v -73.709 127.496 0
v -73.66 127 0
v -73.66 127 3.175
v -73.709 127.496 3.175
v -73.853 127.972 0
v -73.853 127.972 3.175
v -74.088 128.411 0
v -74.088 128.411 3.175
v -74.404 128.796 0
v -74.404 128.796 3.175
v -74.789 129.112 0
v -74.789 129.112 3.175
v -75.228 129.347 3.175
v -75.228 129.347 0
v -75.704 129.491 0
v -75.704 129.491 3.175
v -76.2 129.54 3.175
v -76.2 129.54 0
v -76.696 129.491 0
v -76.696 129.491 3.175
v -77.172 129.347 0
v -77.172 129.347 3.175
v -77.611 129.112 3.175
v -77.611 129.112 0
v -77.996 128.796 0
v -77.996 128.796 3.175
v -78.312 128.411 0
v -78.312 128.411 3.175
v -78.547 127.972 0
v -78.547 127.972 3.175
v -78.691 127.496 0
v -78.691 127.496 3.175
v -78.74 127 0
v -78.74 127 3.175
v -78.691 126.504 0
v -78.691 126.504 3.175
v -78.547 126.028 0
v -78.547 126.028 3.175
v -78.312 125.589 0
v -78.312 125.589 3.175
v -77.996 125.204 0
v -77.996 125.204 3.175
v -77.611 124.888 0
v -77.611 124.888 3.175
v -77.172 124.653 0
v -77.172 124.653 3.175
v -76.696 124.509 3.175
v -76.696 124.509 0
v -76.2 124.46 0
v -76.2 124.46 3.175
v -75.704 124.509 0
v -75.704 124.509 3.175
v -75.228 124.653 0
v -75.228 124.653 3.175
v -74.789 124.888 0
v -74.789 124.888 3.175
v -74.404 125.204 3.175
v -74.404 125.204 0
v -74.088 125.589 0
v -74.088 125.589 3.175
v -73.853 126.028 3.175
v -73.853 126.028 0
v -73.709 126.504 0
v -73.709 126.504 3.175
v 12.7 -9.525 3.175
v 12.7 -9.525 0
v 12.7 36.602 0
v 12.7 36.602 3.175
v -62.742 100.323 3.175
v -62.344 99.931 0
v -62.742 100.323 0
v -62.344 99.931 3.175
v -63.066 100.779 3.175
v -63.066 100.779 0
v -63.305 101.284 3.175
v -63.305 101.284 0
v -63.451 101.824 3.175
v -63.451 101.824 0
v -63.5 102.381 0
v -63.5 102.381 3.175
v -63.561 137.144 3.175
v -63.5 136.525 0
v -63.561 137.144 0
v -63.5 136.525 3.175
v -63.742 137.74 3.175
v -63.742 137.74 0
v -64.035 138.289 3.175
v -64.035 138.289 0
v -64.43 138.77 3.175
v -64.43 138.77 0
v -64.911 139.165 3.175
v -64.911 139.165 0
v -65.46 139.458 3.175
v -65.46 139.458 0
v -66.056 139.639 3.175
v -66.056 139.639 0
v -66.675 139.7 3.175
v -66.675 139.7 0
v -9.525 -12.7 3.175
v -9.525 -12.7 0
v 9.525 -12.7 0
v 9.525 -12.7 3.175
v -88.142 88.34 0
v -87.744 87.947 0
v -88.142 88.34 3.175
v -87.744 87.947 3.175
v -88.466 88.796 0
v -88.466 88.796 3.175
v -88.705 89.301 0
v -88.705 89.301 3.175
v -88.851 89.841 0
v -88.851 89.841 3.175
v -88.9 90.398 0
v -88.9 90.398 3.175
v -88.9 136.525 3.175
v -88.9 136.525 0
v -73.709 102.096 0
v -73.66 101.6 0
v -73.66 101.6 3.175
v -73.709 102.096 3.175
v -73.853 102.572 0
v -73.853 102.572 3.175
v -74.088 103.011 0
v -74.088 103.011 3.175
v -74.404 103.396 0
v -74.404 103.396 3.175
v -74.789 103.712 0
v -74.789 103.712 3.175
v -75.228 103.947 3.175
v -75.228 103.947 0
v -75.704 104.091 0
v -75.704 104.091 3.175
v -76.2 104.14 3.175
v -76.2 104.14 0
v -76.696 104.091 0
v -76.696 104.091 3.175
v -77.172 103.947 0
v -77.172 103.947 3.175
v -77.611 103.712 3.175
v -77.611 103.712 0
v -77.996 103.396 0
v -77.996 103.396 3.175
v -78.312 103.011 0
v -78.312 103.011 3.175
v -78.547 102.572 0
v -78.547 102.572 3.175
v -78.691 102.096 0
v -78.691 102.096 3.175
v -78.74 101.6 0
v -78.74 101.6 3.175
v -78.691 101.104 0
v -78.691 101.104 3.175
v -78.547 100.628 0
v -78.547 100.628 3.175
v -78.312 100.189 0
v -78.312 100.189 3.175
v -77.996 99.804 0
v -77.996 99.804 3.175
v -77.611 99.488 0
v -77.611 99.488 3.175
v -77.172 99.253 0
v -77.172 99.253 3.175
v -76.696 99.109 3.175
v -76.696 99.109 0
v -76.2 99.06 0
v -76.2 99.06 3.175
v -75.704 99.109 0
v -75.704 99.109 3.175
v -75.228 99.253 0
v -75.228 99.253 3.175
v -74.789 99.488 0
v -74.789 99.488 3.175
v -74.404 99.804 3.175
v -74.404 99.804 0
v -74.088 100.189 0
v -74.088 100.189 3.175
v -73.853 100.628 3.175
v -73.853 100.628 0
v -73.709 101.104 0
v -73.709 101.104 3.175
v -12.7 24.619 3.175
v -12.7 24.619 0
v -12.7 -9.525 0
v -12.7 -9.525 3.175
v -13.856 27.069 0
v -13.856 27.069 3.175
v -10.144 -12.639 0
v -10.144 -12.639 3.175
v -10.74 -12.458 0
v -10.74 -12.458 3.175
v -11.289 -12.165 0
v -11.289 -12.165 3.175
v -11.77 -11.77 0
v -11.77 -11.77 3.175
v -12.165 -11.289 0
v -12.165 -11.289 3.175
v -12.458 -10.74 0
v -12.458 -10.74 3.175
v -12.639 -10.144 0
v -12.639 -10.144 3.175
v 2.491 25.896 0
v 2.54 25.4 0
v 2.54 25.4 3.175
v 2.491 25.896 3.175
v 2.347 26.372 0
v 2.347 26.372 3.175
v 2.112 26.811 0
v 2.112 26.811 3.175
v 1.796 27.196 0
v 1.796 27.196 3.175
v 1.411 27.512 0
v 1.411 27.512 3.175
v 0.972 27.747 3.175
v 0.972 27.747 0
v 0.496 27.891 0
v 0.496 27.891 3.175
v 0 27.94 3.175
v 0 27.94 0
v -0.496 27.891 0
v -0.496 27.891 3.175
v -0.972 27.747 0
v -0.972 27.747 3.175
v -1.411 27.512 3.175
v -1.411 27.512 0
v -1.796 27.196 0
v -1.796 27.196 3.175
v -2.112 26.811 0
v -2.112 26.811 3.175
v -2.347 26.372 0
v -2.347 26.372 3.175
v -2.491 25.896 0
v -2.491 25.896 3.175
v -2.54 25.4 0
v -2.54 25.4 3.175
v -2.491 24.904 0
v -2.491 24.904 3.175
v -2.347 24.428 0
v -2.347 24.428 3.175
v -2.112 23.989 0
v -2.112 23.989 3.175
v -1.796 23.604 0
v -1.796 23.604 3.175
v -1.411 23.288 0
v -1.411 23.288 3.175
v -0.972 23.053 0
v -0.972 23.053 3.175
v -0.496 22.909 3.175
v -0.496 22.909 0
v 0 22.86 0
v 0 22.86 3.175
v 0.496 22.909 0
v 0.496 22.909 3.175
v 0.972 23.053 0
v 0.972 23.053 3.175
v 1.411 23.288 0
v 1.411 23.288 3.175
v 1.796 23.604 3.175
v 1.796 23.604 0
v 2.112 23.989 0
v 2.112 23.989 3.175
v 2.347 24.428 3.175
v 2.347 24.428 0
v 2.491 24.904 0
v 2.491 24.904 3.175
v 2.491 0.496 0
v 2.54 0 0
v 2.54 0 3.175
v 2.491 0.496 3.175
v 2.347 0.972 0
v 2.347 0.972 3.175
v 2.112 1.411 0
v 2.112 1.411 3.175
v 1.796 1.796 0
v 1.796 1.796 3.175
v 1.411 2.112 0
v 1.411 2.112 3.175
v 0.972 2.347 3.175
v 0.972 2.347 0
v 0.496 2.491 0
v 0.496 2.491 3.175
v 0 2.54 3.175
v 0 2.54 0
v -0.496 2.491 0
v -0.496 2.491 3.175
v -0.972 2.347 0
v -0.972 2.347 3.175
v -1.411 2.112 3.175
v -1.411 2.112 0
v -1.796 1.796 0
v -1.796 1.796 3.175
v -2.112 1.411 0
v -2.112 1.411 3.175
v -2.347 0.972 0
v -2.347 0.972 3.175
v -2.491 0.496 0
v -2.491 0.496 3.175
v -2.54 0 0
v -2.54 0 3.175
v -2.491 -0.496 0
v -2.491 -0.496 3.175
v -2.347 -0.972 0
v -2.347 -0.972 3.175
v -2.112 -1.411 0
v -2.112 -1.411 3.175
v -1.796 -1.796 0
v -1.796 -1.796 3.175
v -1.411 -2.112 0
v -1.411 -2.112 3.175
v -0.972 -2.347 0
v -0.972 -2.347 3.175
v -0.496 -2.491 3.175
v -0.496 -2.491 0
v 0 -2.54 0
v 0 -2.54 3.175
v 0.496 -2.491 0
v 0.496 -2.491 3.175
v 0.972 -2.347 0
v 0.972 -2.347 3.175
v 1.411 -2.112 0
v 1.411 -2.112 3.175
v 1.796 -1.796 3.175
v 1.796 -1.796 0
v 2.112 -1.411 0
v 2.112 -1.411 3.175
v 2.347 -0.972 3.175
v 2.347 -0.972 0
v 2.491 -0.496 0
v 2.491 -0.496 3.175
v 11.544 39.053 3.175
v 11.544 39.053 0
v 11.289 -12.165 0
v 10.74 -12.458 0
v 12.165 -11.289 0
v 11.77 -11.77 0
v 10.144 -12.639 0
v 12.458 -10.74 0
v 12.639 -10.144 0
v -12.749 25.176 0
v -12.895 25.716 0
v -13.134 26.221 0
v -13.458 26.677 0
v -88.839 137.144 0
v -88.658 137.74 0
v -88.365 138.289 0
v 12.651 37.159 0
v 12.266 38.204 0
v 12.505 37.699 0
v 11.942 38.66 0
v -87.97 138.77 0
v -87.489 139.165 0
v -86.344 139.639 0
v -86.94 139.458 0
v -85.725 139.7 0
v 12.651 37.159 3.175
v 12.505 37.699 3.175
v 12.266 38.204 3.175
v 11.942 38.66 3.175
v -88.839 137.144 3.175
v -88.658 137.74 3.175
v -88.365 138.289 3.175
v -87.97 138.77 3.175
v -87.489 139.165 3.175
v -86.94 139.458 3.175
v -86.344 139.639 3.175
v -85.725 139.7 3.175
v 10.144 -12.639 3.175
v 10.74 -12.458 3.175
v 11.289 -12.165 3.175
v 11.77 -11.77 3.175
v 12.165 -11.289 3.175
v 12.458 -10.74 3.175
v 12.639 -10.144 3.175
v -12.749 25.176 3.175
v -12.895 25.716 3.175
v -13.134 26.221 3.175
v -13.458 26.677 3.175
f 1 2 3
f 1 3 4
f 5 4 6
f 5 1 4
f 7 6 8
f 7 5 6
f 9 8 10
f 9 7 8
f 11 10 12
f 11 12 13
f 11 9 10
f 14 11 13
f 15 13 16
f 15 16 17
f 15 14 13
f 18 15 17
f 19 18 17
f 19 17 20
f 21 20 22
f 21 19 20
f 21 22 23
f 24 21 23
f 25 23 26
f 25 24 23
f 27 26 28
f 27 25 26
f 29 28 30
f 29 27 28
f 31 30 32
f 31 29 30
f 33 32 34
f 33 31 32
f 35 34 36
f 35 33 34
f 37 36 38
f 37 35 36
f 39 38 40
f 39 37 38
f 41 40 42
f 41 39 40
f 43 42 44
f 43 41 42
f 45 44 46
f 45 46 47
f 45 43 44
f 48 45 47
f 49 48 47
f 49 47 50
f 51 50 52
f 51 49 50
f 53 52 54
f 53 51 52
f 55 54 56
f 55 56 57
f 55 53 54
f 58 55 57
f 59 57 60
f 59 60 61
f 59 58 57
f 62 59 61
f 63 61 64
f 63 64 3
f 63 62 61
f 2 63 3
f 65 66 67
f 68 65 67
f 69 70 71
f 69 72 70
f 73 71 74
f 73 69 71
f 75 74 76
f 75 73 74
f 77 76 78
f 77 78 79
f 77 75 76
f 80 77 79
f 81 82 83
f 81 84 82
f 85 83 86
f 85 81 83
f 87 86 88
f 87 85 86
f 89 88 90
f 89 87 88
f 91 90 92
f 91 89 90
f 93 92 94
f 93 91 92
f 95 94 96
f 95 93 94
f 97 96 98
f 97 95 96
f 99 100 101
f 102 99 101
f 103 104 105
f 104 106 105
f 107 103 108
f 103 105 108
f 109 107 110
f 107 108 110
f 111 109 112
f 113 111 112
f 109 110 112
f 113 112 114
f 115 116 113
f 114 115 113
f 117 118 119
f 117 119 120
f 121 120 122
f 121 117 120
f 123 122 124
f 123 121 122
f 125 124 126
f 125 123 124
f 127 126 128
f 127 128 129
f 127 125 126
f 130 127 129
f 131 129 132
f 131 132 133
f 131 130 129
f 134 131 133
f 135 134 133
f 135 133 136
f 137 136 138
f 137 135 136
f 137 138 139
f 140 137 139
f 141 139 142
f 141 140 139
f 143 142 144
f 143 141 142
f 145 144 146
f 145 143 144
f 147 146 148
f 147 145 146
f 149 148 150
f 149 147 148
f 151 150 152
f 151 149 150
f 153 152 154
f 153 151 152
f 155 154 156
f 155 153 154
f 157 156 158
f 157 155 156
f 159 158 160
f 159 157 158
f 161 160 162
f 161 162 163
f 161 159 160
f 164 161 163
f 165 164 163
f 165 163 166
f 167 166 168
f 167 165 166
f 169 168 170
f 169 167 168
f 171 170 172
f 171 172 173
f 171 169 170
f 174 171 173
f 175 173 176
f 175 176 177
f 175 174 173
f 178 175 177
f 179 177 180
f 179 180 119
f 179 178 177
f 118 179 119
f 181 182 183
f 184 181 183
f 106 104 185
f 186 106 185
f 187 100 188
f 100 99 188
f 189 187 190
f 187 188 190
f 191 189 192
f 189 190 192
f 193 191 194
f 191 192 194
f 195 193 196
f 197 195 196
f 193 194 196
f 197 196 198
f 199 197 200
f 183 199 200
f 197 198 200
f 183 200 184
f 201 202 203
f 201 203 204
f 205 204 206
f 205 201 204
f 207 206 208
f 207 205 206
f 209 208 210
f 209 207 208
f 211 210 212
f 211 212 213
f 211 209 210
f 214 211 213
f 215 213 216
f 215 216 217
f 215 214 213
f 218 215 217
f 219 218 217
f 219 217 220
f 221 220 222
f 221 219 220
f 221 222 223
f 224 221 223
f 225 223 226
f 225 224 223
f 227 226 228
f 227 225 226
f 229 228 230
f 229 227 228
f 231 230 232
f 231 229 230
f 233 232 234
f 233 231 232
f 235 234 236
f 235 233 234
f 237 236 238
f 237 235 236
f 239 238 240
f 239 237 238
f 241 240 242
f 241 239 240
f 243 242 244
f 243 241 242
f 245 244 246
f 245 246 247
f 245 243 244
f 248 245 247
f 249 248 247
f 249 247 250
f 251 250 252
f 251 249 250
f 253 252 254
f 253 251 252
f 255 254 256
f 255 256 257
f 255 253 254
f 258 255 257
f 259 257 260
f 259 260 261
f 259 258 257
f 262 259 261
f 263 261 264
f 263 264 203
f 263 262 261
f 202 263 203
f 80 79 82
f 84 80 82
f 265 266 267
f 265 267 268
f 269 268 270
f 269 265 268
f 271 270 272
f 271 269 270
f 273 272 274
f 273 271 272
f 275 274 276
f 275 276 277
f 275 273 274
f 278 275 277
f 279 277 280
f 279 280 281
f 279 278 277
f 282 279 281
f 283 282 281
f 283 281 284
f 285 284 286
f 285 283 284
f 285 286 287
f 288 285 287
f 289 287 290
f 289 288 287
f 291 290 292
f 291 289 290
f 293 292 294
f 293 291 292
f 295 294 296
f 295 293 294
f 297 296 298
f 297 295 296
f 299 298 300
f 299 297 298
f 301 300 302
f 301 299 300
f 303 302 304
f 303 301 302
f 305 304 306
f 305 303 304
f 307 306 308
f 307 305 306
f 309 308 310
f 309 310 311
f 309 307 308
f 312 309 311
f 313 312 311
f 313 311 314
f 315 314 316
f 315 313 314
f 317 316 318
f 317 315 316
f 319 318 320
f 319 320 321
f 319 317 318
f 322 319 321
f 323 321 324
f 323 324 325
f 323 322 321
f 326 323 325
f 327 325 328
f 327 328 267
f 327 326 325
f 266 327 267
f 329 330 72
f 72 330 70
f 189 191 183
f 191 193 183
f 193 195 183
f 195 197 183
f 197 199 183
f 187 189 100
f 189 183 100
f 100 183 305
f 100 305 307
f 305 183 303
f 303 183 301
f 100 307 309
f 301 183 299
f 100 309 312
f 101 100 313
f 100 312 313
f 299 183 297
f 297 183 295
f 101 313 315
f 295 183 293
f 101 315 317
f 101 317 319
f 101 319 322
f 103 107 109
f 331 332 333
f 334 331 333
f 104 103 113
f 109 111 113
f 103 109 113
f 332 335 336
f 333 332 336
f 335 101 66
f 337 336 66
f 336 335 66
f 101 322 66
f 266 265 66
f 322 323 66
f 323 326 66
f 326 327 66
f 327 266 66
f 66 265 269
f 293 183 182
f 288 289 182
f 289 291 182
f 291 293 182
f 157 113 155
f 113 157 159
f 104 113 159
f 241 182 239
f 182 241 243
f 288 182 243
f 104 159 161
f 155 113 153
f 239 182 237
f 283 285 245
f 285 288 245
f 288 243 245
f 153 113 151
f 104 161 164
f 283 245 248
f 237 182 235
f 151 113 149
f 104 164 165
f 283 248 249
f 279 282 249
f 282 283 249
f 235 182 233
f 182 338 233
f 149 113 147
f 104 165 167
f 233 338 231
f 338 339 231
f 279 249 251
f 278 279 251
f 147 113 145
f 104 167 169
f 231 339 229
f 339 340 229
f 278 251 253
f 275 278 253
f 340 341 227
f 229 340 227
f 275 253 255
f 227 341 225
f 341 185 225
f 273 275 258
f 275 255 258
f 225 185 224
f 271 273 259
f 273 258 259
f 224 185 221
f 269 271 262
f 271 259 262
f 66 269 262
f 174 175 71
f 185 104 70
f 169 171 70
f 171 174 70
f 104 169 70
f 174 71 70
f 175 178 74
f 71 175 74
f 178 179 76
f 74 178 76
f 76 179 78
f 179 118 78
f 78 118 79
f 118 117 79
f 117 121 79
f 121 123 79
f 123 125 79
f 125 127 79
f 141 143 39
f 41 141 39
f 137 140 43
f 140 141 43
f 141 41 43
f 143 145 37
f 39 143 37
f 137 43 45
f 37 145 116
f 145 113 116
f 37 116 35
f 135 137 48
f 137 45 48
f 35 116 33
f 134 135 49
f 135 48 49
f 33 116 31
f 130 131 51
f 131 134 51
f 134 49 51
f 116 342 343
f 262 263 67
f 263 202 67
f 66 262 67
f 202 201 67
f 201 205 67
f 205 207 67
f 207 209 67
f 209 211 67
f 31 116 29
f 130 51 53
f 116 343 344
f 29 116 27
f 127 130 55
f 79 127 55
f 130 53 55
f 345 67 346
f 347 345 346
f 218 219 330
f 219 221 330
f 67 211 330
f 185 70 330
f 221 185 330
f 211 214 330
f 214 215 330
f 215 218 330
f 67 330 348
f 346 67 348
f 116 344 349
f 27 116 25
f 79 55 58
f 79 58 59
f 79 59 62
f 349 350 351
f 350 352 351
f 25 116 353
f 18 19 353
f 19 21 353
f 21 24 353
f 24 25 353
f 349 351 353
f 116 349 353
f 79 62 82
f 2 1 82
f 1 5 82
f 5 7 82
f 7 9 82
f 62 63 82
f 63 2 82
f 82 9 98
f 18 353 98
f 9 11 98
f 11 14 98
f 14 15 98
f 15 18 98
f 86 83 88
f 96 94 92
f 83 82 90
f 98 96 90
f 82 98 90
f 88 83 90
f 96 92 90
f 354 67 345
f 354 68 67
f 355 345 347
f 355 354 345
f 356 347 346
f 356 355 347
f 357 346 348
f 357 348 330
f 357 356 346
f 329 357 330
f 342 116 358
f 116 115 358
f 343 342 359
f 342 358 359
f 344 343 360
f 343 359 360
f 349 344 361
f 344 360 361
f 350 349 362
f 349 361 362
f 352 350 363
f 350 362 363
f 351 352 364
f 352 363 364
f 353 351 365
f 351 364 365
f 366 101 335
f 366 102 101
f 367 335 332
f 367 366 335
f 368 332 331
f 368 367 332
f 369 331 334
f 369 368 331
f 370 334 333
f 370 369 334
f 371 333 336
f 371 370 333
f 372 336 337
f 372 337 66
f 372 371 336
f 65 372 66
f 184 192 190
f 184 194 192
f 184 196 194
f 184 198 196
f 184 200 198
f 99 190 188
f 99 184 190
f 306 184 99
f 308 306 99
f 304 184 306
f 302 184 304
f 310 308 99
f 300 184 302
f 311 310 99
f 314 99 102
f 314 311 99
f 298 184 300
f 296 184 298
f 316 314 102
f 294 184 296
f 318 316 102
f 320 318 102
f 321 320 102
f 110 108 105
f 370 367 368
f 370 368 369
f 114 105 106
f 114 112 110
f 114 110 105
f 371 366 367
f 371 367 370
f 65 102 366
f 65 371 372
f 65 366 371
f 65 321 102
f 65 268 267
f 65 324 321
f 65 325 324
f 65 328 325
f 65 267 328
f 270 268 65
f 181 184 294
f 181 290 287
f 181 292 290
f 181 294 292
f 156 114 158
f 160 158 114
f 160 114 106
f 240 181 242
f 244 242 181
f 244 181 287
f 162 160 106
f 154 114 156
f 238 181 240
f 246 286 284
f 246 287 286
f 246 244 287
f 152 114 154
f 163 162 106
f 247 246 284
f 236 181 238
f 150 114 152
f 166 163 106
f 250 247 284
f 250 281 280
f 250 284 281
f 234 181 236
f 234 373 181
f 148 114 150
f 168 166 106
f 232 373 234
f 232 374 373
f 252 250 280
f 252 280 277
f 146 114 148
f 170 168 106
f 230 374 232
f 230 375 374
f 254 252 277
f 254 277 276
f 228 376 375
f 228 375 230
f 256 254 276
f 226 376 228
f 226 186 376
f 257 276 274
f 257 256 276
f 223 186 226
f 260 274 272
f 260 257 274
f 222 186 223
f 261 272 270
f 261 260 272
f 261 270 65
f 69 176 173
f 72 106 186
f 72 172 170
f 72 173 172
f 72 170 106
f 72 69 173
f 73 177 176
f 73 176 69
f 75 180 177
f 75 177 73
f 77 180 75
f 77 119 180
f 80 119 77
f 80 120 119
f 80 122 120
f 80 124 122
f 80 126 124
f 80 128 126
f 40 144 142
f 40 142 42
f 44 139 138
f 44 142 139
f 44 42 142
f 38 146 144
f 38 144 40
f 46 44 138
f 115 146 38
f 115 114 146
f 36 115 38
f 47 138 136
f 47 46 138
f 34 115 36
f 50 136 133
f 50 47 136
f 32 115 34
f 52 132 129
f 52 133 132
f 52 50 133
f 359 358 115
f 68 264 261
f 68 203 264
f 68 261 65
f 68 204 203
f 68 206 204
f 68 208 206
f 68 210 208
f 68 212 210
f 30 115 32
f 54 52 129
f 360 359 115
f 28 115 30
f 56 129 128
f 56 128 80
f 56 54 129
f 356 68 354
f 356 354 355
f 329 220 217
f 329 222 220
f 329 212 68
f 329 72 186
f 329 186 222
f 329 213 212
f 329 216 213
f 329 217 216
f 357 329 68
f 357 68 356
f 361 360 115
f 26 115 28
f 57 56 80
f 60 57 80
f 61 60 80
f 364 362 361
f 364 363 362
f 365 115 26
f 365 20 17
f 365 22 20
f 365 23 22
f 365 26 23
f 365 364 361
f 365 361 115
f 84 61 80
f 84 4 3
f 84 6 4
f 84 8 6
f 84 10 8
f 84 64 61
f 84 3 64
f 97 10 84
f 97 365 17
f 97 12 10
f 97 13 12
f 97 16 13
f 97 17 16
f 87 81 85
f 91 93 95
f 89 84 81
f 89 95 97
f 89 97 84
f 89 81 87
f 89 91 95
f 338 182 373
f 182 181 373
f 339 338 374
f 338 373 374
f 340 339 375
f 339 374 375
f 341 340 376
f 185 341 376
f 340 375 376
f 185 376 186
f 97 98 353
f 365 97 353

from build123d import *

# Parameters (mm, degrees)
SKETCH1_R           = 2.54
BOSS_EXTRUDE1_DEPTH = 3.175
FILLET1_R           = 3.175


with BuildPart() as part:
    # Sketch1 → Boss-Extrude1 (new body)
    with BuildSketch(Plane.XY):
        Polygon((-12.7, -12.7), (12.7, -12.7), (12.7, 38.1), (-63.5, 100.883206633), (-63.5, 139.7), (-88.9, 139.7), (-88.9, 88.9), (-12.7, 26.116793367), align=None)
        with Locations((0, 25.4)):
            Circle(SKETCH1_R, mode=Mode.SUBTRACT)
        Circle(SKETCH1_R, mode=Mode.SUBTRACT)
        with Locations((-76.2, 127)):
            Circle(SKETCH1_R, mode=Mode.SUBTRACT)
        with Locations((-76.2, 101.6)):
            Circle(SKETCH1_R, mode=Mode.SUBTRACT)
    extrude(amount=BOSS_EXTRUDE1_DEPTH)

    # Fillet1
    fillet1_edges = [part.edges().sort_by_distance(p)[0] for p in [
        (-88.9, 88.9, 1.5875),
        (-88.9, 139.7, 1.5875),
        (-63.5, 139.7, 1.5875),
        (-63.5, 100.883206633, 1.5875),
        (12.7, 38.1, 1.5875),
        (12.7, -12.7, 1.5875),
        (-12.7, -12.7, 1.5875),
        (-12.7, 26.116793367, 1.5875),
    ]]
    fillet(fillet1_edges, radius=FILLET1_R)


solid = part.part
